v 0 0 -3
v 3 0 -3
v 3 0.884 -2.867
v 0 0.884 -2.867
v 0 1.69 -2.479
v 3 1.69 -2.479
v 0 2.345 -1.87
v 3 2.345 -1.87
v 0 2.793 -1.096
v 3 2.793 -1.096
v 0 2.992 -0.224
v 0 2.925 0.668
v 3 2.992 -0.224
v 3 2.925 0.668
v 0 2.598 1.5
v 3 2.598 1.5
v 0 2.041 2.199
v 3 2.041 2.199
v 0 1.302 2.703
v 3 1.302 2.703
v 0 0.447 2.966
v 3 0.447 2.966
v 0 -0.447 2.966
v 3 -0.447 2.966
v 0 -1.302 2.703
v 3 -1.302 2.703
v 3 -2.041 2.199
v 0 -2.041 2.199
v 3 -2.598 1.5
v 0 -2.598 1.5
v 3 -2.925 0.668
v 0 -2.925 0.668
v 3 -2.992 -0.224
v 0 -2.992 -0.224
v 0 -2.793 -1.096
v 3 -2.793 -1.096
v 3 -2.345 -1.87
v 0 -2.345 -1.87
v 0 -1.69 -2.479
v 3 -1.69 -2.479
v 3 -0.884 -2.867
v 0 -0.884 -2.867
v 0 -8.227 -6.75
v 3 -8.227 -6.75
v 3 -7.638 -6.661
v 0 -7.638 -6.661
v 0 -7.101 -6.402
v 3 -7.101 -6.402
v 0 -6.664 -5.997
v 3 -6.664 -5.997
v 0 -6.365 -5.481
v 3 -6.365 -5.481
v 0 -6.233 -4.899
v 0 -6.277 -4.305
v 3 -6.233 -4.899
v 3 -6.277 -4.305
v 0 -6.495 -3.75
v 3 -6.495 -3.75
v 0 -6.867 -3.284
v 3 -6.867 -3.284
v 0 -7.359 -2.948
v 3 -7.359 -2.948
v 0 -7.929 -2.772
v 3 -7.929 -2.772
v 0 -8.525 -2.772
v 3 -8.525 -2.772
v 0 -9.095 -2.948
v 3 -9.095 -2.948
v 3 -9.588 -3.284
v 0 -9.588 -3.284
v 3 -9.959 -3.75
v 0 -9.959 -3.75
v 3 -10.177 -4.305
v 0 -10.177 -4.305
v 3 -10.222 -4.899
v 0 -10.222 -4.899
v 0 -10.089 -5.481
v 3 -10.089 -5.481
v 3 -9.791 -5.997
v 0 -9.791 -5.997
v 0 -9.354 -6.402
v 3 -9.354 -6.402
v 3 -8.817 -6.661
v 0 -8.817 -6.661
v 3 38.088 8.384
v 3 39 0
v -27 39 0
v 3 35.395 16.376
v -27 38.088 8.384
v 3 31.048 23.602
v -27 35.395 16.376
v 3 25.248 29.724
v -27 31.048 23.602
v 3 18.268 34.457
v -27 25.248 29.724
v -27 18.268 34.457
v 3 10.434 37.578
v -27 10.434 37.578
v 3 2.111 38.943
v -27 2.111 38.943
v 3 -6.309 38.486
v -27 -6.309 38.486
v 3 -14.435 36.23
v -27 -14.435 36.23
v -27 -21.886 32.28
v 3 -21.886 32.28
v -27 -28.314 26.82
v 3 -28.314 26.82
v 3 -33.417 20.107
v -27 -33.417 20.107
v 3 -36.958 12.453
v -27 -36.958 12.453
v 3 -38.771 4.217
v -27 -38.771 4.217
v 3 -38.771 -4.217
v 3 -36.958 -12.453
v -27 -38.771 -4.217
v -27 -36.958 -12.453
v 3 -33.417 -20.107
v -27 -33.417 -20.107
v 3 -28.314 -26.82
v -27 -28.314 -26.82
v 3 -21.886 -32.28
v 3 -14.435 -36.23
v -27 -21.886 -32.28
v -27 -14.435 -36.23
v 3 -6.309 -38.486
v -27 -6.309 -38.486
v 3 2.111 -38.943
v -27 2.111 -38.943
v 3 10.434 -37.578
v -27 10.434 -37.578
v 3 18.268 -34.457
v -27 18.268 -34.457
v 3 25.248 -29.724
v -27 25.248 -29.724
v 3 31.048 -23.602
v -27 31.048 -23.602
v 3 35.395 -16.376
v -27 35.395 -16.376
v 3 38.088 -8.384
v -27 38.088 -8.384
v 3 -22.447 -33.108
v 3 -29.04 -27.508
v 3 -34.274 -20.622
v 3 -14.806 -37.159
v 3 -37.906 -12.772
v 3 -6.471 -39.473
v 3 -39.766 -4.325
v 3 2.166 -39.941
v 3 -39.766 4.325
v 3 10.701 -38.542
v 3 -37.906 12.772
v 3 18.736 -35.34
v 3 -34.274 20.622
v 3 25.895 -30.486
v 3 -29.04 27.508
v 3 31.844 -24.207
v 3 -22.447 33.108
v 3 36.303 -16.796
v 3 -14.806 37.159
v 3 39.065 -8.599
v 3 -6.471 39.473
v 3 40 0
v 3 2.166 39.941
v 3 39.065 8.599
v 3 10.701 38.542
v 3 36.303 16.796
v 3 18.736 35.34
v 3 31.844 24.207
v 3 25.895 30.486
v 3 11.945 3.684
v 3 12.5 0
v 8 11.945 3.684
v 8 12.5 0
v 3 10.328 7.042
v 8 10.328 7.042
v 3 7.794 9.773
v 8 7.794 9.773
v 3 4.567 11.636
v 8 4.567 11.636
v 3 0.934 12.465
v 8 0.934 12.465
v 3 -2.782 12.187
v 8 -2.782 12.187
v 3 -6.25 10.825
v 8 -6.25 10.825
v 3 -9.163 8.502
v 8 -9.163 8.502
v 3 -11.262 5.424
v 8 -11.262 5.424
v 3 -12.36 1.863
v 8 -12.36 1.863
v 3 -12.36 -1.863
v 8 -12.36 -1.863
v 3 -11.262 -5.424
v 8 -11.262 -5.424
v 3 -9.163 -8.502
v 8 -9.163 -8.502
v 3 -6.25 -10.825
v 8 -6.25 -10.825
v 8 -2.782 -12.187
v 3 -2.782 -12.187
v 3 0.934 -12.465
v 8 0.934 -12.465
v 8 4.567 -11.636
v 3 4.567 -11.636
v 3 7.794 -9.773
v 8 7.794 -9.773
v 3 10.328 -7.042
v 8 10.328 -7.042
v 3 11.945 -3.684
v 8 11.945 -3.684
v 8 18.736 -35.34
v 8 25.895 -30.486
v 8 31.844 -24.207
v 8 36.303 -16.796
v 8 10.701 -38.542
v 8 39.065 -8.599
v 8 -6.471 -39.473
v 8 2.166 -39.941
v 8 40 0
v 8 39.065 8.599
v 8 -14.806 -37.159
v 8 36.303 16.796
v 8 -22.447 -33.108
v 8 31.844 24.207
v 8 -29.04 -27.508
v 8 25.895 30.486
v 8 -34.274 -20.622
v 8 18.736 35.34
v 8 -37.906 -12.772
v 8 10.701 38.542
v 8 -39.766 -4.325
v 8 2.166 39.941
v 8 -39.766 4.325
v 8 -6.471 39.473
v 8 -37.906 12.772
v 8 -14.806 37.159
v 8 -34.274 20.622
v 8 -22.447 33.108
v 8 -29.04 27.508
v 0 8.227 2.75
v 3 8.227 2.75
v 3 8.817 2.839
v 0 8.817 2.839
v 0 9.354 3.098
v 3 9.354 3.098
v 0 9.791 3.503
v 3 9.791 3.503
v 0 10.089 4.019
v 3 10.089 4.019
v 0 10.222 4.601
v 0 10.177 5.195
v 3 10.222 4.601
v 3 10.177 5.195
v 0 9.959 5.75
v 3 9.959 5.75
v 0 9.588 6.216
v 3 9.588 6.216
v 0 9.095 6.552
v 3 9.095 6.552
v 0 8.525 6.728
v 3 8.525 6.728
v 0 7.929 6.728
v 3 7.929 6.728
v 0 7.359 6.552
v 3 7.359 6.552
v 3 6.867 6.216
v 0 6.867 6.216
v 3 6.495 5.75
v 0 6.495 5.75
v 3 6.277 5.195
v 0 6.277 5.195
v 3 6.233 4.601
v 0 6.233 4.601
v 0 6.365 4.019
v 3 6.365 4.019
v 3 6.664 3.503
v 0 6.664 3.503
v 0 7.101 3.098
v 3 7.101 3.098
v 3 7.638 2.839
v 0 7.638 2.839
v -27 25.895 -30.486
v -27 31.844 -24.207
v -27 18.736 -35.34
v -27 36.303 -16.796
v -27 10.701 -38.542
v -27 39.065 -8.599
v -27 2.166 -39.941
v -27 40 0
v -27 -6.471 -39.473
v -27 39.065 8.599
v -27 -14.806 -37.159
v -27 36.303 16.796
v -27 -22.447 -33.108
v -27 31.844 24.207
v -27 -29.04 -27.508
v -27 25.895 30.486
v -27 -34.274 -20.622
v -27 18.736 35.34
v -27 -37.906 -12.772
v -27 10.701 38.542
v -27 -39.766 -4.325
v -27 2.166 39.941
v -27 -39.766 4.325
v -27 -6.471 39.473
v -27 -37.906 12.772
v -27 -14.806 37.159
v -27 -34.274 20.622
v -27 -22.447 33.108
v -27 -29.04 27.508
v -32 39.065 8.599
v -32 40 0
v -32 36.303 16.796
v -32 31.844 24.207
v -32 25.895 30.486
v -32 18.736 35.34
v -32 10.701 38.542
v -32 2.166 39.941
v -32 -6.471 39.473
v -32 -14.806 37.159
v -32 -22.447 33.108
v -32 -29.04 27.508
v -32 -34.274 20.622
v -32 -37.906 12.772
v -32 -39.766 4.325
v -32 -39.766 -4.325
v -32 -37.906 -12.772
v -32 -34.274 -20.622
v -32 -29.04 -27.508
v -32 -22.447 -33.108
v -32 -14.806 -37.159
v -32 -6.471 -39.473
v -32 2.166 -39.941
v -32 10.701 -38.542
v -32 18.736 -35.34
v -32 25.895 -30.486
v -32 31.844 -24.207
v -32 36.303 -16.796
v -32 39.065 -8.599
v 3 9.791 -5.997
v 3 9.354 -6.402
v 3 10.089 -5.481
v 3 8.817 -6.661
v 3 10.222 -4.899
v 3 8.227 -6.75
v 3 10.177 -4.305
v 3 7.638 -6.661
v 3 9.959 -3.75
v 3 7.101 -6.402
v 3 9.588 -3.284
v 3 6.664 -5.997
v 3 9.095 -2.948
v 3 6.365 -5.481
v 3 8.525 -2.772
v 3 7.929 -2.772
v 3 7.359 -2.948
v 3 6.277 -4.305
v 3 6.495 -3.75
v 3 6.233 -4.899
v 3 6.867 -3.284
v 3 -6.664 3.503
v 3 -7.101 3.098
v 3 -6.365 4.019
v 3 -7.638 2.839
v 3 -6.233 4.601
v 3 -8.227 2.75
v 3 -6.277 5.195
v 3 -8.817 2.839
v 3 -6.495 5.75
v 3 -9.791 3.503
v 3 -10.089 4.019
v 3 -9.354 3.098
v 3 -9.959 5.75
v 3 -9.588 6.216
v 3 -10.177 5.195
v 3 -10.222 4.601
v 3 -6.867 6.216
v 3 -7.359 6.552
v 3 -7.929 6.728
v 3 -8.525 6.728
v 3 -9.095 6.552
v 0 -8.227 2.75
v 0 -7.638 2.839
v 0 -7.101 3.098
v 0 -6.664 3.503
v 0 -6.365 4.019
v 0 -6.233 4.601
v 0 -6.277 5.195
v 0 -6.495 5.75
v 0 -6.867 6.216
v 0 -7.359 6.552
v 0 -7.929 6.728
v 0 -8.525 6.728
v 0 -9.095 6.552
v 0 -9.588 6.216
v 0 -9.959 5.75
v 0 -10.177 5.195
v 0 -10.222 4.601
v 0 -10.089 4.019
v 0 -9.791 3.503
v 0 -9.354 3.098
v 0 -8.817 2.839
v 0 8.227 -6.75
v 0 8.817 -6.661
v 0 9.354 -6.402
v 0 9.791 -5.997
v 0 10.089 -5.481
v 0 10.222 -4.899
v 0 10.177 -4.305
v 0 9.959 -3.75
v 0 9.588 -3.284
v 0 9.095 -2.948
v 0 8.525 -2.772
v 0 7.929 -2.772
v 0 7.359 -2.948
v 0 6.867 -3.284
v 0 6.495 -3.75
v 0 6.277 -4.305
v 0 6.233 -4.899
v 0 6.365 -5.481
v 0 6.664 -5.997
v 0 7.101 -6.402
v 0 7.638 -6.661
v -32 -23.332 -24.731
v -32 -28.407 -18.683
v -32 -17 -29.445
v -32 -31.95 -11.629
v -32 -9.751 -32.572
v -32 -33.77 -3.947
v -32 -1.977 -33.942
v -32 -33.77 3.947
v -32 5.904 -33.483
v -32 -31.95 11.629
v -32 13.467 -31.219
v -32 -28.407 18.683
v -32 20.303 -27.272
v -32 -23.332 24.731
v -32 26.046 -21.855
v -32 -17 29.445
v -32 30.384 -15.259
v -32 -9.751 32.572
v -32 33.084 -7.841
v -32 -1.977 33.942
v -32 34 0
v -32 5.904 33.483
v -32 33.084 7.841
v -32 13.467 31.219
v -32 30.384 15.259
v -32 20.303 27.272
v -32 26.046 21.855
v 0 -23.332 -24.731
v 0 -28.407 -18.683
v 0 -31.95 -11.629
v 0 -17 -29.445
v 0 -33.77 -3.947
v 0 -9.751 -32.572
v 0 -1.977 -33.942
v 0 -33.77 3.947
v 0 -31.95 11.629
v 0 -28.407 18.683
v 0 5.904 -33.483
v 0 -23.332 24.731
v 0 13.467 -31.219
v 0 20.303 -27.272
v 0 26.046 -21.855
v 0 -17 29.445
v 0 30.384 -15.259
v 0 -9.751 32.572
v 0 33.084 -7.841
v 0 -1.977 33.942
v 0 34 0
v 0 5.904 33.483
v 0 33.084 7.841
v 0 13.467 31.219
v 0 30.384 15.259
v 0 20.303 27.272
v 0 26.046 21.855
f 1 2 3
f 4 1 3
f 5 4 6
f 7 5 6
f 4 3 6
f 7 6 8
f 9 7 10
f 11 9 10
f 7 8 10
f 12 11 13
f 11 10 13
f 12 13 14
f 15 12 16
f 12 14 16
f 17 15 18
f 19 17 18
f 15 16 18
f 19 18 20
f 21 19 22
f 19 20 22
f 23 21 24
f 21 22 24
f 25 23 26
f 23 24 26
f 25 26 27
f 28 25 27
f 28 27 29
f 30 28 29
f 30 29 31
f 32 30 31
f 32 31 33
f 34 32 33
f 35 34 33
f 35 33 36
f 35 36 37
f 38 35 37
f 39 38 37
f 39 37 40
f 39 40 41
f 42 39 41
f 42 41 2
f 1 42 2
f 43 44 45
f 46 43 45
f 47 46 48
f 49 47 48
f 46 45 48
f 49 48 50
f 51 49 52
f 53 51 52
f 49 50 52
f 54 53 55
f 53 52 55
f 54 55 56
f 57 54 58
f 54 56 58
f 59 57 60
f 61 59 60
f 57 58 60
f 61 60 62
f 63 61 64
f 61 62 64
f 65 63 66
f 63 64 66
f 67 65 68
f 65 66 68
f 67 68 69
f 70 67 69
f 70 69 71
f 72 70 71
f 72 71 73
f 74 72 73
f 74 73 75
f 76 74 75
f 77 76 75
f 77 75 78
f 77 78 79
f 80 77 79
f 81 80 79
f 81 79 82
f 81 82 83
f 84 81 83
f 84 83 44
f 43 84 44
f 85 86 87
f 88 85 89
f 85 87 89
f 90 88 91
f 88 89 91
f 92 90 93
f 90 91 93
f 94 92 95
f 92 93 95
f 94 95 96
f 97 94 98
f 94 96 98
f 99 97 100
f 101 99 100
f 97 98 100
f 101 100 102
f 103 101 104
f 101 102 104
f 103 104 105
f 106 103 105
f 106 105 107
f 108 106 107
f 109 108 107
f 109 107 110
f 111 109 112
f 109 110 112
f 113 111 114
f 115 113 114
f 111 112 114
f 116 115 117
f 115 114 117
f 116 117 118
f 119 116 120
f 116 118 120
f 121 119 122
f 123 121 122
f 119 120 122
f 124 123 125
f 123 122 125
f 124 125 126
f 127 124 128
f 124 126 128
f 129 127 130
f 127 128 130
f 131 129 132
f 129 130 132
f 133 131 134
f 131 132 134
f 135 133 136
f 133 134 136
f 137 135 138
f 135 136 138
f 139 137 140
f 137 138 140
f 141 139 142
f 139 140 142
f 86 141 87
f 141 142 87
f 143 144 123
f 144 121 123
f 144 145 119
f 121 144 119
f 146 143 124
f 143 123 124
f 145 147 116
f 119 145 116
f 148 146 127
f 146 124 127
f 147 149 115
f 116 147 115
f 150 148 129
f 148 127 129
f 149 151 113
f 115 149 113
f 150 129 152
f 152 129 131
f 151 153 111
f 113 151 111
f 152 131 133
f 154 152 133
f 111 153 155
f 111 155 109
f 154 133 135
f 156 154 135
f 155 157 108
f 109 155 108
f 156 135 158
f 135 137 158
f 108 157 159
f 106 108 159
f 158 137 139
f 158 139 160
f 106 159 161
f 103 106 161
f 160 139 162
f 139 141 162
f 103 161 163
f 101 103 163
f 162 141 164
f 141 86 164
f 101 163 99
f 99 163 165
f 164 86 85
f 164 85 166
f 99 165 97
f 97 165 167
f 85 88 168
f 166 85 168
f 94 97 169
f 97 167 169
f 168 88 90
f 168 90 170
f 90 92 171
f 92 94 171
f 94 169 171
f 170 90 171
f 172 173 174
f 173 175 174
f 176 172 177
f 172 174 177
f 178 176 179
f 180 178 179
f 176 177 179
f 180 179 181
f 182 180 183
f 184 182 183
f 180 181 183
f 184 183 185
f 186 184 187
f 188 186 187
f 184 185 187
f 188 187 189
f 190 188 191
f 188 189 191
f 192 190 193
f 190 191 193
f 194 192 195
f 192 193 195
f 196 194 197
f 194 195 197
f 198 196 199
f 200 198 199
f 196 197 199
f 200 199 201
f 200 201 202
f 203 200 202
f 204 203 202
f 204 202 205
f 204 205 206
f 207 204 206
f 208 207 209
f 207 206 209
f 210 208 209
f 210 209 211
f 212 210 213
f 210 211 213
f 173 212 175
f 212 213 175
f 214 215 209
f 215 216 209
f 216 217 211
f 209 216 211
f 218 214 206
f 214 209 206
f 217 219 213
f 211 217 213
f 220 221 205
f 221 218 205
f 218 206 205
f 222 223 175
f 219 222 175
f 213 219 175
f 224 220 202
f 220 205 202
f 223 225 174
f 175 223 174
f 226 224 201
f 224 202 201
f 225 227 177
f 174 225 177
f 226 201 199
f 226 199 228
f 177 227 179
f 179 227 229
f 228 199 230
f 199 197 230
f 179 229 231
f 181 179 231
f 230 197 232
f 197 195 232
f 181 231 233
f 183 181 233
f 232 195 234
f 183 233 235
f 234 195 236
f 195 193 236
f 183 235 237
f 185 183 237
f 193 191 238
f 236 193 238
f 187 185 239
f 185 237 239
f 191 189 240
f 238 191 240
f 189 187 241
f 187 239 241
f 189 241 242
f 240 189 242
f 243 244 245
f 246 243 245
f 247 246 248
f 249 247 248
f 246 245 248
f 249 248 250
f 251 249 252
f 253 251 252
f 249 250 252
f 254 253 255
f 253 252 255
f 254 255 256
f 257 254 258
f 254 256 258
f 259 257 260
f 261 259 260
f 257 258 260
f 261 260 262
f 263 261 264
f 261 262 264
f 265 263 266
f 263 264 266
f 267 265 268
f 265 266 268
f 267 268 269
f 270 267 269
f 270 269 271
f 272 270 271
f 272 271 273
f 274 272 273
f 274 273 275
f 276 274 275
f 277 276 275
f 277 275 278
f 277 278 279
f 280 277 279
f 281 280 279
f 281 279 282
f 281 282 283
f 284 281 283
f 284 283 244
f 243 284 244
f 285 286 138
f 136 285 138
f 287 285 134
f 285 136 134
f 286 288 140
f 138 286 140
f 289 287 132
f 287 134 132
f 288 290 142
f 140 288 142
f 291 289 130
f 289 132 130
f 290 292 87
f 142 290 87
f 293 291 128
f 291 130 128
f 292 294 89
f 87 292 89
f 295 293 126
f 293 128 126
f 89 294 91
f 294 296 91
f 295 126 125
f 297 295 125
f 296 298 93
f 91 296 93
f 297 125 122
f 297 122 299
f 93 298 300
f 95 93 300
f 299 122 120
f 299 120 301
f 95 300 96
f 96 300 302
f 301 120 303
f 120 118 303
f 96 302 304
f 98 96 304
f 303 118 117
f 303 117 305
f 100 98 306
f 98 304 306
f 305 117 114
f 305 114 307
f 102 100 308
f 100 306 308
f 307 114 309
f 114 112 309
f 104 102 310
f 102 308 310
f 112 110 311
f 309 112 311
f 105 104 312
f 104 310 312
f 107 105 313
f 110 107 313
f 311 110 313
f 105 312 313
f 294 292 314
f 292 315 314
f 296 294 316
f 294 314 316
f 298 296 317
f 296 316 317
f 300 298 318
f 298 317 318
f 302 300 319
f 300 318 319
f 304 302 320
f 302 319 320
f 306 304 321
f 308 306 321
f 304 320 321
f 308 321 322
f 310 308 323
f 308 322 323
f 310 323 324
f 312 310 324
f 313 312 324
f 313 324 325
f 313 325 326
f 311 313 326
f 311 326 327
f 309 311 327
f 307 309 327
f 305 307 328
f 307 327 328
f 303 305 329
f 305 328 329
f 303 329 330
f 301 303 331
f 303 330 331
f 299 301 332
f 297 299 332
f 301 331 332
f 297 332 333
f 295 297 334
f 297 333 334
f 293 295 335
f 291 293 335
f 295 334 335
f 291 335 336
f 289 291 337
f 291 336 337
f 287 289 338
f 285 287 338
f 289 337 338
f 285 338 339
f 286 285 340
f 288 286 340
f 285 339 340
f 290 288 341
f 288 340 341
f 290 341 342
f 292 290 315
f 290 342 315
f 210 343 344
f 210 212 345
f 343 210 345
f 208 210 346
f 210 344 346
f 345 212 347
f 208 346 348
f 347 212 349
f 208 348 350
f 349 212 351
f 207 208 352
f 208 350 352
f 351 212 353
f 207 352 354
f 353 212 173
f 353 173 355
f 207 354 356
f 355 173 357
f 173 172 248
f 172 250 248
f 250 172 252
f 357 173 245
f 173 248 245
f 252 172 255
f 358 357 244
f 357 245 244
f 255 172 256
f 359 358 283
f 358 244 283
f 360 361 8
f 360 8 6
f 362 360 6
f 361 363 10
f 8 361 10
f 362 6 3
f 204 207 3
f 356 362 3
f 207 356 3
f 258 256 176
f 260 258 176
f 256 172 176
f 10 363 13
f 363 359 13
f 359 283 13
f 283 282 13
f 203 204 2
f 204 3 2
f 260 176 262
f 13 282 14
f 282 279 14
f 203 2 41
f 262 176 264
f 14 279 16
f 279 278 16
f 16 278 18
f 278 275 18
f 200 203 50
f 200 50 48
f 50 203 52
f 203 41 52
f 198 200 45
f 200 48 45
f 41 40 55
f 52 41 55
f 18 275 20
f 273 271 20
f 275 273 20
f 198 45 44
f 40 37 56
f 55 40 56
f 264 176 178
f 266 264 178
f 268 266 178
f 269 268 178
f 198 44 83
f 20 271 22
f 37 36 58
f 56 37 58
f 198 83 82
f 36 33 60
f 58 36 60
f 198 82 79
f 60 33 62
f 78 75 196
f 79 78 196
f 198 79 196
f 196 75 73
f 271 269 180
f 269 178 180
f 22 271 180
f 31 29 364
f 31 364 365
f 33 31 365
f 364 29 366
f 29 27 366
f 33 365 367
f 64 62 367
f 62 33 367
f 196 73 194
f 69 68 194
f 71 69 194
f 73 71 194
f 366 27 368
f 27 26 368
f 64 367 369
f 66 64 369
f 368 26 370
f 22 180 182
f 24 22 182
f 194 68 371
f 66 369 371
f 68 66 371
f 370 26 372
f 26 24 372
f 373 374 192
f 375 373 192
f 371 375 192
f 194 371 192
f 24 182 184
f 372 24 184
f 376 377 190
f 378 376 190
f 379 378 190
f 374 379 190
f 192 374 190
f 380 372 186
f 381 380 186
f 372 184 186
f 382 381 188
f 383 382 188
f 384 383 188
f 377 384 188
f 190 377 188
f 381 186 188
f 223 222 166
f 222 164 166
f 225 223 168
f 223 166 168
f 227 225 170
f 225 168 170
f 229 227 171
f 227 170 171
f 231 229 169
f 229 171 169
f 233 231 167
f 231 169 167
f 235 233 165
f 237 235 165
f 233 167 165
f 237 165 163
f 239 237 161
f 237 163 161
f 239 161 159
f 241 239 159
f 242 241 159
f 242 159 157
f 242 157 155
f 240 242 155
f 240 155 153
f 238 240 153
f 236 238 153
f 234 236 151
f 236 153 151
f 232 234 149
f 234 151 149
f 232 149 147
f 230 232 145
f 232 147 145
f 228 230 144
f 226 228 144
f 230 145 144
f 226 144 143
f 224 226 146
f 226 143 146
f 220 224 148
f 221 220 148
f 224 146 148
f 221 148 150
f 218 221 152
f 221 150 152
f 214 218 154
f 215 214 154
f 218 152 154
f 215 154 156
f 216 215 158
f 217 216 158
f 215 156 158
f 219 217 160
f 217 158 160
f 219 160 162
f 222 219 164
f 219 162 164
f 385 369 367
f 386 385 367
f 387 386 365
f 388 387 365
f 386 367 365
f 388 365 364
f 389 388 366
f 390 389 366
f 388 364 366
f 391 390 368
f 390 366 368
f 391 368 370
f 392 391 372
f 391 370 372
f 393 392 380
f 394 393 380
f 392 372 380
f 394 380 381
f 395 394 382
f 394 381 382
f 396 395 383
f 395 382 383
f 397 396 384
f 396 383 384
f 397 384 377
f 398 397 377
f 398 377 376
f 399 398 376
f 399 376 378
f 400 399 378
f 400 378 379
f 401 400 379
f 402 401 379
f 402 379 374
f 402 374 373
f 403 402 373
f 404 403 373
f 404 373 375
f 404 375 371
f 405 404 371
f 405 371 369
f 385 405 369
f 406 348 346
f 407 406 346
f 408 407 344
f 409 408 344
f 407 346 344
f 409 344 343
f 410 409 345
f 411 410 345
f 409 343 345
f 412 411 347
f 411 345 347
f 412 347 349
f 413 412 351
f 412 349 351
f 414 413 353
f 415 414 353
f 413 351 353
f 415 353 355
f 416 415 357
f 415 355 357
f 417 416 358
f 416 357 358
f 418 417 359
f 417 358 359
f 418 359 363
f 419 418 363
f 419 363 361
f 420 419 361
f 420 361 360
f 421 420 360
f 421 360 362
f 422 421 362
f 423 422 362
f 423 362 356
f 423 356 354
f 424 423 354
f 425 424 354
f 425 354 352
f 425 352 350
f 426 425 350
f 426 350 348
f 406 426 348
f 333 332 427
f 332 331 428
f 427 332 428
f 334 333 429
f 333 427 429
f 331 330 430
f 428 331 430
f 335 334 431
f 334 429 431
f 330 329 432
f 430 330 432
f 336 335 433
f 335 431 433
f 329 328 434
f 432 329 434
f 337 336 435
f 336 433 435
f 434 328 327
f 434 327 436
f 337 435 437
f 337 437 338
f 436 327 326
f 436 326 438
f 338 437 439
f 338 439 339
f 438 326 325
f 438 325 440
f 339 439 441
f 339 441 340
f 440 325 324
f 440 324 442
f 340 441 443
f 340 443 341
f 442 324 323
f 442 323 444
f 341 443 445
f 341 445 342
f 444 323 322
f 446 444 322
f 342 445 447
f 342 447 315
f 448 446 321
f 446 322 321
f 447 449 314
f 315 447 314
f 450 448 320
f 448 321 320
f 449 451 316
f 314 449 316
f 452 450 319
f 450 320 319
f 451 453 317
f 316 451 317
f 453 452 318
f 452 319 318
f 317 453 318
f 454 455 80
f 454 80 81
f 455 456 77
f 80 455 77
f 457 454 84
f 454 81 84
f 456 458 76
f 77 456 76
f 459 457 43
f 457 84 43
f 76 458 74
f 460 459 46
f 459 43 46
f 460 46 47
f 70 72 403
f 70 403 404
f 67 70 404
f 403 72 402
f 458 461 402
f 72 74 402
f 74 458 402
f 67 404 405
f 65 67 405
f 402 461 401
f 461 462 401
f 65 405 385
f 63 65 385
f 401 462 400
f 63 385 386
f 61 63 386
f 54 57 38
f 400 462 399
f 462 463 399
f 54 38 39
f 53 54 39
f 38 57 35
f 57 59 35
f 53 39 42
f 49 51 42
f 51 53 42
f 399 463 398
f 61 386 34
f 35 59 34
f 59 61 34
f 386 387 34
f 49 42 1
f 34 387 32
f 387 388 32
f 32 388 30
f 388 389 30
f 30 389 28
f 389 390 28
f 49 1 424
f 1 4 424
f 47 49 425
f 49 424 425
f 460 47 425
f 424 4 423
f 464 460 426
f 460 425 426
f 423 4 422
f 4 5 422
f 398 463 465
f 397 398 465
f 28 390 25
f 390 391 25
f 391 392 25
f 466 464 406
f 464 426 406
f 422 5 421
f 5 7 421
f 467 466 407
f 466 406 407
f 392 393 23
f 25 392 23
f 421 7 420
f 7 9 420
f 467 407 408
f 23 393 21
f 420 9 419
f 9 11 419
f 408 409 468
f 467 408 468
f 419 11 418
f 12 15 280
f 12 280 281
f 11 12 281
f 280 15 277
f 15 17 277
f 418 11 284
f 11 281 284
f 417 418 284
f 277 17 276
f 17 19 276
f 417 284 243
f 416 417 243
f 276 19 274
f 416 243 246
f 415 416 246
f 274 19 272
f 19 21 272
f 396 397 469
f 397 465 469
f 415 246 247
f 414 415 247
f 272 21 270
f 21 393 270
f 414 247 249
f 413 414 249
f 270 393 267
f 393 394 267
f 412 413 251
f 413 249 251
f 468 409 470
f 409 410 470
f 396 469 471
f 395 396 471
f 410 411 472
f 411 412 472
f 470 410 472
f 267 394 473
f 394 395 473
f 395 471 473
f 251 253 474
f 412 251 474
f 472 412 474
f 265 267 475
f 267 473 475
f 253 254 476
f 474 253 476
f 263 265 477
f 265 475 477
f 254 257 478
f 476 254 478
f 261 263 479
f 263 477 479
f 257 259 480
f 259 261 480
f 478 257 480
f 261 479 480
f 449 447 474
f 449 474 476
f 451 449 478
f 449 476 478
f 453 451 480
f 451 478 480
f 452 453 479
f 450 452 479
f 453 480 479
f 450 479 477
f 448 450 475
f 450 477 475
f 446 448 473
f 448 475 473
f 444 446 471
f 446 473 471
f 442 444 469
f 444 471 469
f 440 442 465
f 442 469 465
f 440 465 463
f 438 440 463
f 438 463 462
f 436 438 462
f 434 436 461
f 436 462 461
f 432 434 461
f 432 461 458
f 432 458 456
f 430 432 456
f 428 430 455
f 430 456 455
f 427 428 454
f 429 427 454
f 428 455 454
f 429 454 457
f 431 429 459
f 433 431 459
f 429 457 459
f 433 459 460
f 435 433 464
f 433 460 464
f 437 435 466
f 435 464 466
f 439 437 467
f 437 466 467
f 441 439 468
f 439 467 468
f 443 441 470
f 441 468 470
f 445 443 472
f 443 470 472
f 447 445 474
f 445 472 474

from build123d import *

# Parameters (mm, degrees)
ESQUISSE2_W             = 5
ESQUISSE2_H             = 12.5
ESQUISSE3_R             = 2
ENL_V_MAT_EXTRU_1_DEPTH = 36
ESQUISSE4_R             = 3
ENL_V_MAT_EXTRU_2_DEPTH = 36


with BuildPart() as part:
    # Esquisse1 → Révolution1 (revolve)
    with BuildSketch(Plane.XY):
        Polygon((0, 34), (0, 0), (8, 0), (8, 40), (3, 40), (3, 39), (-27, 39), (-27, 40), (-32, 40), (-32, 34), align=None)
    revolve(axis=Axis((-49.644499027, 0, 0), (1, 0, 0)))

    # Esquisse2 → Enlèvement de matière-Révolution1 (revolve, cut)
    with BuildSketch(Plane.XY):
        with Locations((5.5, 6.25)):
            Rectangle(ESQUISSE2_W, ESQUISSE2_H)
    revolve(axis=Axis((0, 0, 0), (1, 0, 0)), mode=Mode.SUBTRACT)

    # Esquisse3 → Enlèv. mat.-Extru.1 (cut, through all)
    with BuildSketch(Plane(origin=(3, 0, 0), x_dir=(0, 0, -1), z_dir=(1, 0, 0))):
        with Locations((4.75, 8.227241336)):
            Circle(ESQUISSE3_R)
        with Locations((-4.75, 8.227241336)):
            Circle(ESQUISSE3_R)
        with Locations((4.75, -8.227241336)):
            Circle(ESQUISSE3_R)
        with Locations((-4.75, -8.227241336)):
            Circle(ESQUISSE3_R)
    extrude(amount=-ENL_V_MAT_EXTRU_1_DEPTH, mode=Mode.SUBTRACT)

    # Esquisse4 → Enlèv. mat.-Extru.2 (cut, through all)
    with BuildSketch(Plane(origin=(3, 0, 0), x_dir=(0, 0, -1), z_dir=(1, 0, 0))):
        Circle(ESQUISSE4_R)
    extrude(amount=-ENL_V_MAT_EXTRU_2_DEPTH, mode=Mode.SUBTRACT)


solid = part.part
